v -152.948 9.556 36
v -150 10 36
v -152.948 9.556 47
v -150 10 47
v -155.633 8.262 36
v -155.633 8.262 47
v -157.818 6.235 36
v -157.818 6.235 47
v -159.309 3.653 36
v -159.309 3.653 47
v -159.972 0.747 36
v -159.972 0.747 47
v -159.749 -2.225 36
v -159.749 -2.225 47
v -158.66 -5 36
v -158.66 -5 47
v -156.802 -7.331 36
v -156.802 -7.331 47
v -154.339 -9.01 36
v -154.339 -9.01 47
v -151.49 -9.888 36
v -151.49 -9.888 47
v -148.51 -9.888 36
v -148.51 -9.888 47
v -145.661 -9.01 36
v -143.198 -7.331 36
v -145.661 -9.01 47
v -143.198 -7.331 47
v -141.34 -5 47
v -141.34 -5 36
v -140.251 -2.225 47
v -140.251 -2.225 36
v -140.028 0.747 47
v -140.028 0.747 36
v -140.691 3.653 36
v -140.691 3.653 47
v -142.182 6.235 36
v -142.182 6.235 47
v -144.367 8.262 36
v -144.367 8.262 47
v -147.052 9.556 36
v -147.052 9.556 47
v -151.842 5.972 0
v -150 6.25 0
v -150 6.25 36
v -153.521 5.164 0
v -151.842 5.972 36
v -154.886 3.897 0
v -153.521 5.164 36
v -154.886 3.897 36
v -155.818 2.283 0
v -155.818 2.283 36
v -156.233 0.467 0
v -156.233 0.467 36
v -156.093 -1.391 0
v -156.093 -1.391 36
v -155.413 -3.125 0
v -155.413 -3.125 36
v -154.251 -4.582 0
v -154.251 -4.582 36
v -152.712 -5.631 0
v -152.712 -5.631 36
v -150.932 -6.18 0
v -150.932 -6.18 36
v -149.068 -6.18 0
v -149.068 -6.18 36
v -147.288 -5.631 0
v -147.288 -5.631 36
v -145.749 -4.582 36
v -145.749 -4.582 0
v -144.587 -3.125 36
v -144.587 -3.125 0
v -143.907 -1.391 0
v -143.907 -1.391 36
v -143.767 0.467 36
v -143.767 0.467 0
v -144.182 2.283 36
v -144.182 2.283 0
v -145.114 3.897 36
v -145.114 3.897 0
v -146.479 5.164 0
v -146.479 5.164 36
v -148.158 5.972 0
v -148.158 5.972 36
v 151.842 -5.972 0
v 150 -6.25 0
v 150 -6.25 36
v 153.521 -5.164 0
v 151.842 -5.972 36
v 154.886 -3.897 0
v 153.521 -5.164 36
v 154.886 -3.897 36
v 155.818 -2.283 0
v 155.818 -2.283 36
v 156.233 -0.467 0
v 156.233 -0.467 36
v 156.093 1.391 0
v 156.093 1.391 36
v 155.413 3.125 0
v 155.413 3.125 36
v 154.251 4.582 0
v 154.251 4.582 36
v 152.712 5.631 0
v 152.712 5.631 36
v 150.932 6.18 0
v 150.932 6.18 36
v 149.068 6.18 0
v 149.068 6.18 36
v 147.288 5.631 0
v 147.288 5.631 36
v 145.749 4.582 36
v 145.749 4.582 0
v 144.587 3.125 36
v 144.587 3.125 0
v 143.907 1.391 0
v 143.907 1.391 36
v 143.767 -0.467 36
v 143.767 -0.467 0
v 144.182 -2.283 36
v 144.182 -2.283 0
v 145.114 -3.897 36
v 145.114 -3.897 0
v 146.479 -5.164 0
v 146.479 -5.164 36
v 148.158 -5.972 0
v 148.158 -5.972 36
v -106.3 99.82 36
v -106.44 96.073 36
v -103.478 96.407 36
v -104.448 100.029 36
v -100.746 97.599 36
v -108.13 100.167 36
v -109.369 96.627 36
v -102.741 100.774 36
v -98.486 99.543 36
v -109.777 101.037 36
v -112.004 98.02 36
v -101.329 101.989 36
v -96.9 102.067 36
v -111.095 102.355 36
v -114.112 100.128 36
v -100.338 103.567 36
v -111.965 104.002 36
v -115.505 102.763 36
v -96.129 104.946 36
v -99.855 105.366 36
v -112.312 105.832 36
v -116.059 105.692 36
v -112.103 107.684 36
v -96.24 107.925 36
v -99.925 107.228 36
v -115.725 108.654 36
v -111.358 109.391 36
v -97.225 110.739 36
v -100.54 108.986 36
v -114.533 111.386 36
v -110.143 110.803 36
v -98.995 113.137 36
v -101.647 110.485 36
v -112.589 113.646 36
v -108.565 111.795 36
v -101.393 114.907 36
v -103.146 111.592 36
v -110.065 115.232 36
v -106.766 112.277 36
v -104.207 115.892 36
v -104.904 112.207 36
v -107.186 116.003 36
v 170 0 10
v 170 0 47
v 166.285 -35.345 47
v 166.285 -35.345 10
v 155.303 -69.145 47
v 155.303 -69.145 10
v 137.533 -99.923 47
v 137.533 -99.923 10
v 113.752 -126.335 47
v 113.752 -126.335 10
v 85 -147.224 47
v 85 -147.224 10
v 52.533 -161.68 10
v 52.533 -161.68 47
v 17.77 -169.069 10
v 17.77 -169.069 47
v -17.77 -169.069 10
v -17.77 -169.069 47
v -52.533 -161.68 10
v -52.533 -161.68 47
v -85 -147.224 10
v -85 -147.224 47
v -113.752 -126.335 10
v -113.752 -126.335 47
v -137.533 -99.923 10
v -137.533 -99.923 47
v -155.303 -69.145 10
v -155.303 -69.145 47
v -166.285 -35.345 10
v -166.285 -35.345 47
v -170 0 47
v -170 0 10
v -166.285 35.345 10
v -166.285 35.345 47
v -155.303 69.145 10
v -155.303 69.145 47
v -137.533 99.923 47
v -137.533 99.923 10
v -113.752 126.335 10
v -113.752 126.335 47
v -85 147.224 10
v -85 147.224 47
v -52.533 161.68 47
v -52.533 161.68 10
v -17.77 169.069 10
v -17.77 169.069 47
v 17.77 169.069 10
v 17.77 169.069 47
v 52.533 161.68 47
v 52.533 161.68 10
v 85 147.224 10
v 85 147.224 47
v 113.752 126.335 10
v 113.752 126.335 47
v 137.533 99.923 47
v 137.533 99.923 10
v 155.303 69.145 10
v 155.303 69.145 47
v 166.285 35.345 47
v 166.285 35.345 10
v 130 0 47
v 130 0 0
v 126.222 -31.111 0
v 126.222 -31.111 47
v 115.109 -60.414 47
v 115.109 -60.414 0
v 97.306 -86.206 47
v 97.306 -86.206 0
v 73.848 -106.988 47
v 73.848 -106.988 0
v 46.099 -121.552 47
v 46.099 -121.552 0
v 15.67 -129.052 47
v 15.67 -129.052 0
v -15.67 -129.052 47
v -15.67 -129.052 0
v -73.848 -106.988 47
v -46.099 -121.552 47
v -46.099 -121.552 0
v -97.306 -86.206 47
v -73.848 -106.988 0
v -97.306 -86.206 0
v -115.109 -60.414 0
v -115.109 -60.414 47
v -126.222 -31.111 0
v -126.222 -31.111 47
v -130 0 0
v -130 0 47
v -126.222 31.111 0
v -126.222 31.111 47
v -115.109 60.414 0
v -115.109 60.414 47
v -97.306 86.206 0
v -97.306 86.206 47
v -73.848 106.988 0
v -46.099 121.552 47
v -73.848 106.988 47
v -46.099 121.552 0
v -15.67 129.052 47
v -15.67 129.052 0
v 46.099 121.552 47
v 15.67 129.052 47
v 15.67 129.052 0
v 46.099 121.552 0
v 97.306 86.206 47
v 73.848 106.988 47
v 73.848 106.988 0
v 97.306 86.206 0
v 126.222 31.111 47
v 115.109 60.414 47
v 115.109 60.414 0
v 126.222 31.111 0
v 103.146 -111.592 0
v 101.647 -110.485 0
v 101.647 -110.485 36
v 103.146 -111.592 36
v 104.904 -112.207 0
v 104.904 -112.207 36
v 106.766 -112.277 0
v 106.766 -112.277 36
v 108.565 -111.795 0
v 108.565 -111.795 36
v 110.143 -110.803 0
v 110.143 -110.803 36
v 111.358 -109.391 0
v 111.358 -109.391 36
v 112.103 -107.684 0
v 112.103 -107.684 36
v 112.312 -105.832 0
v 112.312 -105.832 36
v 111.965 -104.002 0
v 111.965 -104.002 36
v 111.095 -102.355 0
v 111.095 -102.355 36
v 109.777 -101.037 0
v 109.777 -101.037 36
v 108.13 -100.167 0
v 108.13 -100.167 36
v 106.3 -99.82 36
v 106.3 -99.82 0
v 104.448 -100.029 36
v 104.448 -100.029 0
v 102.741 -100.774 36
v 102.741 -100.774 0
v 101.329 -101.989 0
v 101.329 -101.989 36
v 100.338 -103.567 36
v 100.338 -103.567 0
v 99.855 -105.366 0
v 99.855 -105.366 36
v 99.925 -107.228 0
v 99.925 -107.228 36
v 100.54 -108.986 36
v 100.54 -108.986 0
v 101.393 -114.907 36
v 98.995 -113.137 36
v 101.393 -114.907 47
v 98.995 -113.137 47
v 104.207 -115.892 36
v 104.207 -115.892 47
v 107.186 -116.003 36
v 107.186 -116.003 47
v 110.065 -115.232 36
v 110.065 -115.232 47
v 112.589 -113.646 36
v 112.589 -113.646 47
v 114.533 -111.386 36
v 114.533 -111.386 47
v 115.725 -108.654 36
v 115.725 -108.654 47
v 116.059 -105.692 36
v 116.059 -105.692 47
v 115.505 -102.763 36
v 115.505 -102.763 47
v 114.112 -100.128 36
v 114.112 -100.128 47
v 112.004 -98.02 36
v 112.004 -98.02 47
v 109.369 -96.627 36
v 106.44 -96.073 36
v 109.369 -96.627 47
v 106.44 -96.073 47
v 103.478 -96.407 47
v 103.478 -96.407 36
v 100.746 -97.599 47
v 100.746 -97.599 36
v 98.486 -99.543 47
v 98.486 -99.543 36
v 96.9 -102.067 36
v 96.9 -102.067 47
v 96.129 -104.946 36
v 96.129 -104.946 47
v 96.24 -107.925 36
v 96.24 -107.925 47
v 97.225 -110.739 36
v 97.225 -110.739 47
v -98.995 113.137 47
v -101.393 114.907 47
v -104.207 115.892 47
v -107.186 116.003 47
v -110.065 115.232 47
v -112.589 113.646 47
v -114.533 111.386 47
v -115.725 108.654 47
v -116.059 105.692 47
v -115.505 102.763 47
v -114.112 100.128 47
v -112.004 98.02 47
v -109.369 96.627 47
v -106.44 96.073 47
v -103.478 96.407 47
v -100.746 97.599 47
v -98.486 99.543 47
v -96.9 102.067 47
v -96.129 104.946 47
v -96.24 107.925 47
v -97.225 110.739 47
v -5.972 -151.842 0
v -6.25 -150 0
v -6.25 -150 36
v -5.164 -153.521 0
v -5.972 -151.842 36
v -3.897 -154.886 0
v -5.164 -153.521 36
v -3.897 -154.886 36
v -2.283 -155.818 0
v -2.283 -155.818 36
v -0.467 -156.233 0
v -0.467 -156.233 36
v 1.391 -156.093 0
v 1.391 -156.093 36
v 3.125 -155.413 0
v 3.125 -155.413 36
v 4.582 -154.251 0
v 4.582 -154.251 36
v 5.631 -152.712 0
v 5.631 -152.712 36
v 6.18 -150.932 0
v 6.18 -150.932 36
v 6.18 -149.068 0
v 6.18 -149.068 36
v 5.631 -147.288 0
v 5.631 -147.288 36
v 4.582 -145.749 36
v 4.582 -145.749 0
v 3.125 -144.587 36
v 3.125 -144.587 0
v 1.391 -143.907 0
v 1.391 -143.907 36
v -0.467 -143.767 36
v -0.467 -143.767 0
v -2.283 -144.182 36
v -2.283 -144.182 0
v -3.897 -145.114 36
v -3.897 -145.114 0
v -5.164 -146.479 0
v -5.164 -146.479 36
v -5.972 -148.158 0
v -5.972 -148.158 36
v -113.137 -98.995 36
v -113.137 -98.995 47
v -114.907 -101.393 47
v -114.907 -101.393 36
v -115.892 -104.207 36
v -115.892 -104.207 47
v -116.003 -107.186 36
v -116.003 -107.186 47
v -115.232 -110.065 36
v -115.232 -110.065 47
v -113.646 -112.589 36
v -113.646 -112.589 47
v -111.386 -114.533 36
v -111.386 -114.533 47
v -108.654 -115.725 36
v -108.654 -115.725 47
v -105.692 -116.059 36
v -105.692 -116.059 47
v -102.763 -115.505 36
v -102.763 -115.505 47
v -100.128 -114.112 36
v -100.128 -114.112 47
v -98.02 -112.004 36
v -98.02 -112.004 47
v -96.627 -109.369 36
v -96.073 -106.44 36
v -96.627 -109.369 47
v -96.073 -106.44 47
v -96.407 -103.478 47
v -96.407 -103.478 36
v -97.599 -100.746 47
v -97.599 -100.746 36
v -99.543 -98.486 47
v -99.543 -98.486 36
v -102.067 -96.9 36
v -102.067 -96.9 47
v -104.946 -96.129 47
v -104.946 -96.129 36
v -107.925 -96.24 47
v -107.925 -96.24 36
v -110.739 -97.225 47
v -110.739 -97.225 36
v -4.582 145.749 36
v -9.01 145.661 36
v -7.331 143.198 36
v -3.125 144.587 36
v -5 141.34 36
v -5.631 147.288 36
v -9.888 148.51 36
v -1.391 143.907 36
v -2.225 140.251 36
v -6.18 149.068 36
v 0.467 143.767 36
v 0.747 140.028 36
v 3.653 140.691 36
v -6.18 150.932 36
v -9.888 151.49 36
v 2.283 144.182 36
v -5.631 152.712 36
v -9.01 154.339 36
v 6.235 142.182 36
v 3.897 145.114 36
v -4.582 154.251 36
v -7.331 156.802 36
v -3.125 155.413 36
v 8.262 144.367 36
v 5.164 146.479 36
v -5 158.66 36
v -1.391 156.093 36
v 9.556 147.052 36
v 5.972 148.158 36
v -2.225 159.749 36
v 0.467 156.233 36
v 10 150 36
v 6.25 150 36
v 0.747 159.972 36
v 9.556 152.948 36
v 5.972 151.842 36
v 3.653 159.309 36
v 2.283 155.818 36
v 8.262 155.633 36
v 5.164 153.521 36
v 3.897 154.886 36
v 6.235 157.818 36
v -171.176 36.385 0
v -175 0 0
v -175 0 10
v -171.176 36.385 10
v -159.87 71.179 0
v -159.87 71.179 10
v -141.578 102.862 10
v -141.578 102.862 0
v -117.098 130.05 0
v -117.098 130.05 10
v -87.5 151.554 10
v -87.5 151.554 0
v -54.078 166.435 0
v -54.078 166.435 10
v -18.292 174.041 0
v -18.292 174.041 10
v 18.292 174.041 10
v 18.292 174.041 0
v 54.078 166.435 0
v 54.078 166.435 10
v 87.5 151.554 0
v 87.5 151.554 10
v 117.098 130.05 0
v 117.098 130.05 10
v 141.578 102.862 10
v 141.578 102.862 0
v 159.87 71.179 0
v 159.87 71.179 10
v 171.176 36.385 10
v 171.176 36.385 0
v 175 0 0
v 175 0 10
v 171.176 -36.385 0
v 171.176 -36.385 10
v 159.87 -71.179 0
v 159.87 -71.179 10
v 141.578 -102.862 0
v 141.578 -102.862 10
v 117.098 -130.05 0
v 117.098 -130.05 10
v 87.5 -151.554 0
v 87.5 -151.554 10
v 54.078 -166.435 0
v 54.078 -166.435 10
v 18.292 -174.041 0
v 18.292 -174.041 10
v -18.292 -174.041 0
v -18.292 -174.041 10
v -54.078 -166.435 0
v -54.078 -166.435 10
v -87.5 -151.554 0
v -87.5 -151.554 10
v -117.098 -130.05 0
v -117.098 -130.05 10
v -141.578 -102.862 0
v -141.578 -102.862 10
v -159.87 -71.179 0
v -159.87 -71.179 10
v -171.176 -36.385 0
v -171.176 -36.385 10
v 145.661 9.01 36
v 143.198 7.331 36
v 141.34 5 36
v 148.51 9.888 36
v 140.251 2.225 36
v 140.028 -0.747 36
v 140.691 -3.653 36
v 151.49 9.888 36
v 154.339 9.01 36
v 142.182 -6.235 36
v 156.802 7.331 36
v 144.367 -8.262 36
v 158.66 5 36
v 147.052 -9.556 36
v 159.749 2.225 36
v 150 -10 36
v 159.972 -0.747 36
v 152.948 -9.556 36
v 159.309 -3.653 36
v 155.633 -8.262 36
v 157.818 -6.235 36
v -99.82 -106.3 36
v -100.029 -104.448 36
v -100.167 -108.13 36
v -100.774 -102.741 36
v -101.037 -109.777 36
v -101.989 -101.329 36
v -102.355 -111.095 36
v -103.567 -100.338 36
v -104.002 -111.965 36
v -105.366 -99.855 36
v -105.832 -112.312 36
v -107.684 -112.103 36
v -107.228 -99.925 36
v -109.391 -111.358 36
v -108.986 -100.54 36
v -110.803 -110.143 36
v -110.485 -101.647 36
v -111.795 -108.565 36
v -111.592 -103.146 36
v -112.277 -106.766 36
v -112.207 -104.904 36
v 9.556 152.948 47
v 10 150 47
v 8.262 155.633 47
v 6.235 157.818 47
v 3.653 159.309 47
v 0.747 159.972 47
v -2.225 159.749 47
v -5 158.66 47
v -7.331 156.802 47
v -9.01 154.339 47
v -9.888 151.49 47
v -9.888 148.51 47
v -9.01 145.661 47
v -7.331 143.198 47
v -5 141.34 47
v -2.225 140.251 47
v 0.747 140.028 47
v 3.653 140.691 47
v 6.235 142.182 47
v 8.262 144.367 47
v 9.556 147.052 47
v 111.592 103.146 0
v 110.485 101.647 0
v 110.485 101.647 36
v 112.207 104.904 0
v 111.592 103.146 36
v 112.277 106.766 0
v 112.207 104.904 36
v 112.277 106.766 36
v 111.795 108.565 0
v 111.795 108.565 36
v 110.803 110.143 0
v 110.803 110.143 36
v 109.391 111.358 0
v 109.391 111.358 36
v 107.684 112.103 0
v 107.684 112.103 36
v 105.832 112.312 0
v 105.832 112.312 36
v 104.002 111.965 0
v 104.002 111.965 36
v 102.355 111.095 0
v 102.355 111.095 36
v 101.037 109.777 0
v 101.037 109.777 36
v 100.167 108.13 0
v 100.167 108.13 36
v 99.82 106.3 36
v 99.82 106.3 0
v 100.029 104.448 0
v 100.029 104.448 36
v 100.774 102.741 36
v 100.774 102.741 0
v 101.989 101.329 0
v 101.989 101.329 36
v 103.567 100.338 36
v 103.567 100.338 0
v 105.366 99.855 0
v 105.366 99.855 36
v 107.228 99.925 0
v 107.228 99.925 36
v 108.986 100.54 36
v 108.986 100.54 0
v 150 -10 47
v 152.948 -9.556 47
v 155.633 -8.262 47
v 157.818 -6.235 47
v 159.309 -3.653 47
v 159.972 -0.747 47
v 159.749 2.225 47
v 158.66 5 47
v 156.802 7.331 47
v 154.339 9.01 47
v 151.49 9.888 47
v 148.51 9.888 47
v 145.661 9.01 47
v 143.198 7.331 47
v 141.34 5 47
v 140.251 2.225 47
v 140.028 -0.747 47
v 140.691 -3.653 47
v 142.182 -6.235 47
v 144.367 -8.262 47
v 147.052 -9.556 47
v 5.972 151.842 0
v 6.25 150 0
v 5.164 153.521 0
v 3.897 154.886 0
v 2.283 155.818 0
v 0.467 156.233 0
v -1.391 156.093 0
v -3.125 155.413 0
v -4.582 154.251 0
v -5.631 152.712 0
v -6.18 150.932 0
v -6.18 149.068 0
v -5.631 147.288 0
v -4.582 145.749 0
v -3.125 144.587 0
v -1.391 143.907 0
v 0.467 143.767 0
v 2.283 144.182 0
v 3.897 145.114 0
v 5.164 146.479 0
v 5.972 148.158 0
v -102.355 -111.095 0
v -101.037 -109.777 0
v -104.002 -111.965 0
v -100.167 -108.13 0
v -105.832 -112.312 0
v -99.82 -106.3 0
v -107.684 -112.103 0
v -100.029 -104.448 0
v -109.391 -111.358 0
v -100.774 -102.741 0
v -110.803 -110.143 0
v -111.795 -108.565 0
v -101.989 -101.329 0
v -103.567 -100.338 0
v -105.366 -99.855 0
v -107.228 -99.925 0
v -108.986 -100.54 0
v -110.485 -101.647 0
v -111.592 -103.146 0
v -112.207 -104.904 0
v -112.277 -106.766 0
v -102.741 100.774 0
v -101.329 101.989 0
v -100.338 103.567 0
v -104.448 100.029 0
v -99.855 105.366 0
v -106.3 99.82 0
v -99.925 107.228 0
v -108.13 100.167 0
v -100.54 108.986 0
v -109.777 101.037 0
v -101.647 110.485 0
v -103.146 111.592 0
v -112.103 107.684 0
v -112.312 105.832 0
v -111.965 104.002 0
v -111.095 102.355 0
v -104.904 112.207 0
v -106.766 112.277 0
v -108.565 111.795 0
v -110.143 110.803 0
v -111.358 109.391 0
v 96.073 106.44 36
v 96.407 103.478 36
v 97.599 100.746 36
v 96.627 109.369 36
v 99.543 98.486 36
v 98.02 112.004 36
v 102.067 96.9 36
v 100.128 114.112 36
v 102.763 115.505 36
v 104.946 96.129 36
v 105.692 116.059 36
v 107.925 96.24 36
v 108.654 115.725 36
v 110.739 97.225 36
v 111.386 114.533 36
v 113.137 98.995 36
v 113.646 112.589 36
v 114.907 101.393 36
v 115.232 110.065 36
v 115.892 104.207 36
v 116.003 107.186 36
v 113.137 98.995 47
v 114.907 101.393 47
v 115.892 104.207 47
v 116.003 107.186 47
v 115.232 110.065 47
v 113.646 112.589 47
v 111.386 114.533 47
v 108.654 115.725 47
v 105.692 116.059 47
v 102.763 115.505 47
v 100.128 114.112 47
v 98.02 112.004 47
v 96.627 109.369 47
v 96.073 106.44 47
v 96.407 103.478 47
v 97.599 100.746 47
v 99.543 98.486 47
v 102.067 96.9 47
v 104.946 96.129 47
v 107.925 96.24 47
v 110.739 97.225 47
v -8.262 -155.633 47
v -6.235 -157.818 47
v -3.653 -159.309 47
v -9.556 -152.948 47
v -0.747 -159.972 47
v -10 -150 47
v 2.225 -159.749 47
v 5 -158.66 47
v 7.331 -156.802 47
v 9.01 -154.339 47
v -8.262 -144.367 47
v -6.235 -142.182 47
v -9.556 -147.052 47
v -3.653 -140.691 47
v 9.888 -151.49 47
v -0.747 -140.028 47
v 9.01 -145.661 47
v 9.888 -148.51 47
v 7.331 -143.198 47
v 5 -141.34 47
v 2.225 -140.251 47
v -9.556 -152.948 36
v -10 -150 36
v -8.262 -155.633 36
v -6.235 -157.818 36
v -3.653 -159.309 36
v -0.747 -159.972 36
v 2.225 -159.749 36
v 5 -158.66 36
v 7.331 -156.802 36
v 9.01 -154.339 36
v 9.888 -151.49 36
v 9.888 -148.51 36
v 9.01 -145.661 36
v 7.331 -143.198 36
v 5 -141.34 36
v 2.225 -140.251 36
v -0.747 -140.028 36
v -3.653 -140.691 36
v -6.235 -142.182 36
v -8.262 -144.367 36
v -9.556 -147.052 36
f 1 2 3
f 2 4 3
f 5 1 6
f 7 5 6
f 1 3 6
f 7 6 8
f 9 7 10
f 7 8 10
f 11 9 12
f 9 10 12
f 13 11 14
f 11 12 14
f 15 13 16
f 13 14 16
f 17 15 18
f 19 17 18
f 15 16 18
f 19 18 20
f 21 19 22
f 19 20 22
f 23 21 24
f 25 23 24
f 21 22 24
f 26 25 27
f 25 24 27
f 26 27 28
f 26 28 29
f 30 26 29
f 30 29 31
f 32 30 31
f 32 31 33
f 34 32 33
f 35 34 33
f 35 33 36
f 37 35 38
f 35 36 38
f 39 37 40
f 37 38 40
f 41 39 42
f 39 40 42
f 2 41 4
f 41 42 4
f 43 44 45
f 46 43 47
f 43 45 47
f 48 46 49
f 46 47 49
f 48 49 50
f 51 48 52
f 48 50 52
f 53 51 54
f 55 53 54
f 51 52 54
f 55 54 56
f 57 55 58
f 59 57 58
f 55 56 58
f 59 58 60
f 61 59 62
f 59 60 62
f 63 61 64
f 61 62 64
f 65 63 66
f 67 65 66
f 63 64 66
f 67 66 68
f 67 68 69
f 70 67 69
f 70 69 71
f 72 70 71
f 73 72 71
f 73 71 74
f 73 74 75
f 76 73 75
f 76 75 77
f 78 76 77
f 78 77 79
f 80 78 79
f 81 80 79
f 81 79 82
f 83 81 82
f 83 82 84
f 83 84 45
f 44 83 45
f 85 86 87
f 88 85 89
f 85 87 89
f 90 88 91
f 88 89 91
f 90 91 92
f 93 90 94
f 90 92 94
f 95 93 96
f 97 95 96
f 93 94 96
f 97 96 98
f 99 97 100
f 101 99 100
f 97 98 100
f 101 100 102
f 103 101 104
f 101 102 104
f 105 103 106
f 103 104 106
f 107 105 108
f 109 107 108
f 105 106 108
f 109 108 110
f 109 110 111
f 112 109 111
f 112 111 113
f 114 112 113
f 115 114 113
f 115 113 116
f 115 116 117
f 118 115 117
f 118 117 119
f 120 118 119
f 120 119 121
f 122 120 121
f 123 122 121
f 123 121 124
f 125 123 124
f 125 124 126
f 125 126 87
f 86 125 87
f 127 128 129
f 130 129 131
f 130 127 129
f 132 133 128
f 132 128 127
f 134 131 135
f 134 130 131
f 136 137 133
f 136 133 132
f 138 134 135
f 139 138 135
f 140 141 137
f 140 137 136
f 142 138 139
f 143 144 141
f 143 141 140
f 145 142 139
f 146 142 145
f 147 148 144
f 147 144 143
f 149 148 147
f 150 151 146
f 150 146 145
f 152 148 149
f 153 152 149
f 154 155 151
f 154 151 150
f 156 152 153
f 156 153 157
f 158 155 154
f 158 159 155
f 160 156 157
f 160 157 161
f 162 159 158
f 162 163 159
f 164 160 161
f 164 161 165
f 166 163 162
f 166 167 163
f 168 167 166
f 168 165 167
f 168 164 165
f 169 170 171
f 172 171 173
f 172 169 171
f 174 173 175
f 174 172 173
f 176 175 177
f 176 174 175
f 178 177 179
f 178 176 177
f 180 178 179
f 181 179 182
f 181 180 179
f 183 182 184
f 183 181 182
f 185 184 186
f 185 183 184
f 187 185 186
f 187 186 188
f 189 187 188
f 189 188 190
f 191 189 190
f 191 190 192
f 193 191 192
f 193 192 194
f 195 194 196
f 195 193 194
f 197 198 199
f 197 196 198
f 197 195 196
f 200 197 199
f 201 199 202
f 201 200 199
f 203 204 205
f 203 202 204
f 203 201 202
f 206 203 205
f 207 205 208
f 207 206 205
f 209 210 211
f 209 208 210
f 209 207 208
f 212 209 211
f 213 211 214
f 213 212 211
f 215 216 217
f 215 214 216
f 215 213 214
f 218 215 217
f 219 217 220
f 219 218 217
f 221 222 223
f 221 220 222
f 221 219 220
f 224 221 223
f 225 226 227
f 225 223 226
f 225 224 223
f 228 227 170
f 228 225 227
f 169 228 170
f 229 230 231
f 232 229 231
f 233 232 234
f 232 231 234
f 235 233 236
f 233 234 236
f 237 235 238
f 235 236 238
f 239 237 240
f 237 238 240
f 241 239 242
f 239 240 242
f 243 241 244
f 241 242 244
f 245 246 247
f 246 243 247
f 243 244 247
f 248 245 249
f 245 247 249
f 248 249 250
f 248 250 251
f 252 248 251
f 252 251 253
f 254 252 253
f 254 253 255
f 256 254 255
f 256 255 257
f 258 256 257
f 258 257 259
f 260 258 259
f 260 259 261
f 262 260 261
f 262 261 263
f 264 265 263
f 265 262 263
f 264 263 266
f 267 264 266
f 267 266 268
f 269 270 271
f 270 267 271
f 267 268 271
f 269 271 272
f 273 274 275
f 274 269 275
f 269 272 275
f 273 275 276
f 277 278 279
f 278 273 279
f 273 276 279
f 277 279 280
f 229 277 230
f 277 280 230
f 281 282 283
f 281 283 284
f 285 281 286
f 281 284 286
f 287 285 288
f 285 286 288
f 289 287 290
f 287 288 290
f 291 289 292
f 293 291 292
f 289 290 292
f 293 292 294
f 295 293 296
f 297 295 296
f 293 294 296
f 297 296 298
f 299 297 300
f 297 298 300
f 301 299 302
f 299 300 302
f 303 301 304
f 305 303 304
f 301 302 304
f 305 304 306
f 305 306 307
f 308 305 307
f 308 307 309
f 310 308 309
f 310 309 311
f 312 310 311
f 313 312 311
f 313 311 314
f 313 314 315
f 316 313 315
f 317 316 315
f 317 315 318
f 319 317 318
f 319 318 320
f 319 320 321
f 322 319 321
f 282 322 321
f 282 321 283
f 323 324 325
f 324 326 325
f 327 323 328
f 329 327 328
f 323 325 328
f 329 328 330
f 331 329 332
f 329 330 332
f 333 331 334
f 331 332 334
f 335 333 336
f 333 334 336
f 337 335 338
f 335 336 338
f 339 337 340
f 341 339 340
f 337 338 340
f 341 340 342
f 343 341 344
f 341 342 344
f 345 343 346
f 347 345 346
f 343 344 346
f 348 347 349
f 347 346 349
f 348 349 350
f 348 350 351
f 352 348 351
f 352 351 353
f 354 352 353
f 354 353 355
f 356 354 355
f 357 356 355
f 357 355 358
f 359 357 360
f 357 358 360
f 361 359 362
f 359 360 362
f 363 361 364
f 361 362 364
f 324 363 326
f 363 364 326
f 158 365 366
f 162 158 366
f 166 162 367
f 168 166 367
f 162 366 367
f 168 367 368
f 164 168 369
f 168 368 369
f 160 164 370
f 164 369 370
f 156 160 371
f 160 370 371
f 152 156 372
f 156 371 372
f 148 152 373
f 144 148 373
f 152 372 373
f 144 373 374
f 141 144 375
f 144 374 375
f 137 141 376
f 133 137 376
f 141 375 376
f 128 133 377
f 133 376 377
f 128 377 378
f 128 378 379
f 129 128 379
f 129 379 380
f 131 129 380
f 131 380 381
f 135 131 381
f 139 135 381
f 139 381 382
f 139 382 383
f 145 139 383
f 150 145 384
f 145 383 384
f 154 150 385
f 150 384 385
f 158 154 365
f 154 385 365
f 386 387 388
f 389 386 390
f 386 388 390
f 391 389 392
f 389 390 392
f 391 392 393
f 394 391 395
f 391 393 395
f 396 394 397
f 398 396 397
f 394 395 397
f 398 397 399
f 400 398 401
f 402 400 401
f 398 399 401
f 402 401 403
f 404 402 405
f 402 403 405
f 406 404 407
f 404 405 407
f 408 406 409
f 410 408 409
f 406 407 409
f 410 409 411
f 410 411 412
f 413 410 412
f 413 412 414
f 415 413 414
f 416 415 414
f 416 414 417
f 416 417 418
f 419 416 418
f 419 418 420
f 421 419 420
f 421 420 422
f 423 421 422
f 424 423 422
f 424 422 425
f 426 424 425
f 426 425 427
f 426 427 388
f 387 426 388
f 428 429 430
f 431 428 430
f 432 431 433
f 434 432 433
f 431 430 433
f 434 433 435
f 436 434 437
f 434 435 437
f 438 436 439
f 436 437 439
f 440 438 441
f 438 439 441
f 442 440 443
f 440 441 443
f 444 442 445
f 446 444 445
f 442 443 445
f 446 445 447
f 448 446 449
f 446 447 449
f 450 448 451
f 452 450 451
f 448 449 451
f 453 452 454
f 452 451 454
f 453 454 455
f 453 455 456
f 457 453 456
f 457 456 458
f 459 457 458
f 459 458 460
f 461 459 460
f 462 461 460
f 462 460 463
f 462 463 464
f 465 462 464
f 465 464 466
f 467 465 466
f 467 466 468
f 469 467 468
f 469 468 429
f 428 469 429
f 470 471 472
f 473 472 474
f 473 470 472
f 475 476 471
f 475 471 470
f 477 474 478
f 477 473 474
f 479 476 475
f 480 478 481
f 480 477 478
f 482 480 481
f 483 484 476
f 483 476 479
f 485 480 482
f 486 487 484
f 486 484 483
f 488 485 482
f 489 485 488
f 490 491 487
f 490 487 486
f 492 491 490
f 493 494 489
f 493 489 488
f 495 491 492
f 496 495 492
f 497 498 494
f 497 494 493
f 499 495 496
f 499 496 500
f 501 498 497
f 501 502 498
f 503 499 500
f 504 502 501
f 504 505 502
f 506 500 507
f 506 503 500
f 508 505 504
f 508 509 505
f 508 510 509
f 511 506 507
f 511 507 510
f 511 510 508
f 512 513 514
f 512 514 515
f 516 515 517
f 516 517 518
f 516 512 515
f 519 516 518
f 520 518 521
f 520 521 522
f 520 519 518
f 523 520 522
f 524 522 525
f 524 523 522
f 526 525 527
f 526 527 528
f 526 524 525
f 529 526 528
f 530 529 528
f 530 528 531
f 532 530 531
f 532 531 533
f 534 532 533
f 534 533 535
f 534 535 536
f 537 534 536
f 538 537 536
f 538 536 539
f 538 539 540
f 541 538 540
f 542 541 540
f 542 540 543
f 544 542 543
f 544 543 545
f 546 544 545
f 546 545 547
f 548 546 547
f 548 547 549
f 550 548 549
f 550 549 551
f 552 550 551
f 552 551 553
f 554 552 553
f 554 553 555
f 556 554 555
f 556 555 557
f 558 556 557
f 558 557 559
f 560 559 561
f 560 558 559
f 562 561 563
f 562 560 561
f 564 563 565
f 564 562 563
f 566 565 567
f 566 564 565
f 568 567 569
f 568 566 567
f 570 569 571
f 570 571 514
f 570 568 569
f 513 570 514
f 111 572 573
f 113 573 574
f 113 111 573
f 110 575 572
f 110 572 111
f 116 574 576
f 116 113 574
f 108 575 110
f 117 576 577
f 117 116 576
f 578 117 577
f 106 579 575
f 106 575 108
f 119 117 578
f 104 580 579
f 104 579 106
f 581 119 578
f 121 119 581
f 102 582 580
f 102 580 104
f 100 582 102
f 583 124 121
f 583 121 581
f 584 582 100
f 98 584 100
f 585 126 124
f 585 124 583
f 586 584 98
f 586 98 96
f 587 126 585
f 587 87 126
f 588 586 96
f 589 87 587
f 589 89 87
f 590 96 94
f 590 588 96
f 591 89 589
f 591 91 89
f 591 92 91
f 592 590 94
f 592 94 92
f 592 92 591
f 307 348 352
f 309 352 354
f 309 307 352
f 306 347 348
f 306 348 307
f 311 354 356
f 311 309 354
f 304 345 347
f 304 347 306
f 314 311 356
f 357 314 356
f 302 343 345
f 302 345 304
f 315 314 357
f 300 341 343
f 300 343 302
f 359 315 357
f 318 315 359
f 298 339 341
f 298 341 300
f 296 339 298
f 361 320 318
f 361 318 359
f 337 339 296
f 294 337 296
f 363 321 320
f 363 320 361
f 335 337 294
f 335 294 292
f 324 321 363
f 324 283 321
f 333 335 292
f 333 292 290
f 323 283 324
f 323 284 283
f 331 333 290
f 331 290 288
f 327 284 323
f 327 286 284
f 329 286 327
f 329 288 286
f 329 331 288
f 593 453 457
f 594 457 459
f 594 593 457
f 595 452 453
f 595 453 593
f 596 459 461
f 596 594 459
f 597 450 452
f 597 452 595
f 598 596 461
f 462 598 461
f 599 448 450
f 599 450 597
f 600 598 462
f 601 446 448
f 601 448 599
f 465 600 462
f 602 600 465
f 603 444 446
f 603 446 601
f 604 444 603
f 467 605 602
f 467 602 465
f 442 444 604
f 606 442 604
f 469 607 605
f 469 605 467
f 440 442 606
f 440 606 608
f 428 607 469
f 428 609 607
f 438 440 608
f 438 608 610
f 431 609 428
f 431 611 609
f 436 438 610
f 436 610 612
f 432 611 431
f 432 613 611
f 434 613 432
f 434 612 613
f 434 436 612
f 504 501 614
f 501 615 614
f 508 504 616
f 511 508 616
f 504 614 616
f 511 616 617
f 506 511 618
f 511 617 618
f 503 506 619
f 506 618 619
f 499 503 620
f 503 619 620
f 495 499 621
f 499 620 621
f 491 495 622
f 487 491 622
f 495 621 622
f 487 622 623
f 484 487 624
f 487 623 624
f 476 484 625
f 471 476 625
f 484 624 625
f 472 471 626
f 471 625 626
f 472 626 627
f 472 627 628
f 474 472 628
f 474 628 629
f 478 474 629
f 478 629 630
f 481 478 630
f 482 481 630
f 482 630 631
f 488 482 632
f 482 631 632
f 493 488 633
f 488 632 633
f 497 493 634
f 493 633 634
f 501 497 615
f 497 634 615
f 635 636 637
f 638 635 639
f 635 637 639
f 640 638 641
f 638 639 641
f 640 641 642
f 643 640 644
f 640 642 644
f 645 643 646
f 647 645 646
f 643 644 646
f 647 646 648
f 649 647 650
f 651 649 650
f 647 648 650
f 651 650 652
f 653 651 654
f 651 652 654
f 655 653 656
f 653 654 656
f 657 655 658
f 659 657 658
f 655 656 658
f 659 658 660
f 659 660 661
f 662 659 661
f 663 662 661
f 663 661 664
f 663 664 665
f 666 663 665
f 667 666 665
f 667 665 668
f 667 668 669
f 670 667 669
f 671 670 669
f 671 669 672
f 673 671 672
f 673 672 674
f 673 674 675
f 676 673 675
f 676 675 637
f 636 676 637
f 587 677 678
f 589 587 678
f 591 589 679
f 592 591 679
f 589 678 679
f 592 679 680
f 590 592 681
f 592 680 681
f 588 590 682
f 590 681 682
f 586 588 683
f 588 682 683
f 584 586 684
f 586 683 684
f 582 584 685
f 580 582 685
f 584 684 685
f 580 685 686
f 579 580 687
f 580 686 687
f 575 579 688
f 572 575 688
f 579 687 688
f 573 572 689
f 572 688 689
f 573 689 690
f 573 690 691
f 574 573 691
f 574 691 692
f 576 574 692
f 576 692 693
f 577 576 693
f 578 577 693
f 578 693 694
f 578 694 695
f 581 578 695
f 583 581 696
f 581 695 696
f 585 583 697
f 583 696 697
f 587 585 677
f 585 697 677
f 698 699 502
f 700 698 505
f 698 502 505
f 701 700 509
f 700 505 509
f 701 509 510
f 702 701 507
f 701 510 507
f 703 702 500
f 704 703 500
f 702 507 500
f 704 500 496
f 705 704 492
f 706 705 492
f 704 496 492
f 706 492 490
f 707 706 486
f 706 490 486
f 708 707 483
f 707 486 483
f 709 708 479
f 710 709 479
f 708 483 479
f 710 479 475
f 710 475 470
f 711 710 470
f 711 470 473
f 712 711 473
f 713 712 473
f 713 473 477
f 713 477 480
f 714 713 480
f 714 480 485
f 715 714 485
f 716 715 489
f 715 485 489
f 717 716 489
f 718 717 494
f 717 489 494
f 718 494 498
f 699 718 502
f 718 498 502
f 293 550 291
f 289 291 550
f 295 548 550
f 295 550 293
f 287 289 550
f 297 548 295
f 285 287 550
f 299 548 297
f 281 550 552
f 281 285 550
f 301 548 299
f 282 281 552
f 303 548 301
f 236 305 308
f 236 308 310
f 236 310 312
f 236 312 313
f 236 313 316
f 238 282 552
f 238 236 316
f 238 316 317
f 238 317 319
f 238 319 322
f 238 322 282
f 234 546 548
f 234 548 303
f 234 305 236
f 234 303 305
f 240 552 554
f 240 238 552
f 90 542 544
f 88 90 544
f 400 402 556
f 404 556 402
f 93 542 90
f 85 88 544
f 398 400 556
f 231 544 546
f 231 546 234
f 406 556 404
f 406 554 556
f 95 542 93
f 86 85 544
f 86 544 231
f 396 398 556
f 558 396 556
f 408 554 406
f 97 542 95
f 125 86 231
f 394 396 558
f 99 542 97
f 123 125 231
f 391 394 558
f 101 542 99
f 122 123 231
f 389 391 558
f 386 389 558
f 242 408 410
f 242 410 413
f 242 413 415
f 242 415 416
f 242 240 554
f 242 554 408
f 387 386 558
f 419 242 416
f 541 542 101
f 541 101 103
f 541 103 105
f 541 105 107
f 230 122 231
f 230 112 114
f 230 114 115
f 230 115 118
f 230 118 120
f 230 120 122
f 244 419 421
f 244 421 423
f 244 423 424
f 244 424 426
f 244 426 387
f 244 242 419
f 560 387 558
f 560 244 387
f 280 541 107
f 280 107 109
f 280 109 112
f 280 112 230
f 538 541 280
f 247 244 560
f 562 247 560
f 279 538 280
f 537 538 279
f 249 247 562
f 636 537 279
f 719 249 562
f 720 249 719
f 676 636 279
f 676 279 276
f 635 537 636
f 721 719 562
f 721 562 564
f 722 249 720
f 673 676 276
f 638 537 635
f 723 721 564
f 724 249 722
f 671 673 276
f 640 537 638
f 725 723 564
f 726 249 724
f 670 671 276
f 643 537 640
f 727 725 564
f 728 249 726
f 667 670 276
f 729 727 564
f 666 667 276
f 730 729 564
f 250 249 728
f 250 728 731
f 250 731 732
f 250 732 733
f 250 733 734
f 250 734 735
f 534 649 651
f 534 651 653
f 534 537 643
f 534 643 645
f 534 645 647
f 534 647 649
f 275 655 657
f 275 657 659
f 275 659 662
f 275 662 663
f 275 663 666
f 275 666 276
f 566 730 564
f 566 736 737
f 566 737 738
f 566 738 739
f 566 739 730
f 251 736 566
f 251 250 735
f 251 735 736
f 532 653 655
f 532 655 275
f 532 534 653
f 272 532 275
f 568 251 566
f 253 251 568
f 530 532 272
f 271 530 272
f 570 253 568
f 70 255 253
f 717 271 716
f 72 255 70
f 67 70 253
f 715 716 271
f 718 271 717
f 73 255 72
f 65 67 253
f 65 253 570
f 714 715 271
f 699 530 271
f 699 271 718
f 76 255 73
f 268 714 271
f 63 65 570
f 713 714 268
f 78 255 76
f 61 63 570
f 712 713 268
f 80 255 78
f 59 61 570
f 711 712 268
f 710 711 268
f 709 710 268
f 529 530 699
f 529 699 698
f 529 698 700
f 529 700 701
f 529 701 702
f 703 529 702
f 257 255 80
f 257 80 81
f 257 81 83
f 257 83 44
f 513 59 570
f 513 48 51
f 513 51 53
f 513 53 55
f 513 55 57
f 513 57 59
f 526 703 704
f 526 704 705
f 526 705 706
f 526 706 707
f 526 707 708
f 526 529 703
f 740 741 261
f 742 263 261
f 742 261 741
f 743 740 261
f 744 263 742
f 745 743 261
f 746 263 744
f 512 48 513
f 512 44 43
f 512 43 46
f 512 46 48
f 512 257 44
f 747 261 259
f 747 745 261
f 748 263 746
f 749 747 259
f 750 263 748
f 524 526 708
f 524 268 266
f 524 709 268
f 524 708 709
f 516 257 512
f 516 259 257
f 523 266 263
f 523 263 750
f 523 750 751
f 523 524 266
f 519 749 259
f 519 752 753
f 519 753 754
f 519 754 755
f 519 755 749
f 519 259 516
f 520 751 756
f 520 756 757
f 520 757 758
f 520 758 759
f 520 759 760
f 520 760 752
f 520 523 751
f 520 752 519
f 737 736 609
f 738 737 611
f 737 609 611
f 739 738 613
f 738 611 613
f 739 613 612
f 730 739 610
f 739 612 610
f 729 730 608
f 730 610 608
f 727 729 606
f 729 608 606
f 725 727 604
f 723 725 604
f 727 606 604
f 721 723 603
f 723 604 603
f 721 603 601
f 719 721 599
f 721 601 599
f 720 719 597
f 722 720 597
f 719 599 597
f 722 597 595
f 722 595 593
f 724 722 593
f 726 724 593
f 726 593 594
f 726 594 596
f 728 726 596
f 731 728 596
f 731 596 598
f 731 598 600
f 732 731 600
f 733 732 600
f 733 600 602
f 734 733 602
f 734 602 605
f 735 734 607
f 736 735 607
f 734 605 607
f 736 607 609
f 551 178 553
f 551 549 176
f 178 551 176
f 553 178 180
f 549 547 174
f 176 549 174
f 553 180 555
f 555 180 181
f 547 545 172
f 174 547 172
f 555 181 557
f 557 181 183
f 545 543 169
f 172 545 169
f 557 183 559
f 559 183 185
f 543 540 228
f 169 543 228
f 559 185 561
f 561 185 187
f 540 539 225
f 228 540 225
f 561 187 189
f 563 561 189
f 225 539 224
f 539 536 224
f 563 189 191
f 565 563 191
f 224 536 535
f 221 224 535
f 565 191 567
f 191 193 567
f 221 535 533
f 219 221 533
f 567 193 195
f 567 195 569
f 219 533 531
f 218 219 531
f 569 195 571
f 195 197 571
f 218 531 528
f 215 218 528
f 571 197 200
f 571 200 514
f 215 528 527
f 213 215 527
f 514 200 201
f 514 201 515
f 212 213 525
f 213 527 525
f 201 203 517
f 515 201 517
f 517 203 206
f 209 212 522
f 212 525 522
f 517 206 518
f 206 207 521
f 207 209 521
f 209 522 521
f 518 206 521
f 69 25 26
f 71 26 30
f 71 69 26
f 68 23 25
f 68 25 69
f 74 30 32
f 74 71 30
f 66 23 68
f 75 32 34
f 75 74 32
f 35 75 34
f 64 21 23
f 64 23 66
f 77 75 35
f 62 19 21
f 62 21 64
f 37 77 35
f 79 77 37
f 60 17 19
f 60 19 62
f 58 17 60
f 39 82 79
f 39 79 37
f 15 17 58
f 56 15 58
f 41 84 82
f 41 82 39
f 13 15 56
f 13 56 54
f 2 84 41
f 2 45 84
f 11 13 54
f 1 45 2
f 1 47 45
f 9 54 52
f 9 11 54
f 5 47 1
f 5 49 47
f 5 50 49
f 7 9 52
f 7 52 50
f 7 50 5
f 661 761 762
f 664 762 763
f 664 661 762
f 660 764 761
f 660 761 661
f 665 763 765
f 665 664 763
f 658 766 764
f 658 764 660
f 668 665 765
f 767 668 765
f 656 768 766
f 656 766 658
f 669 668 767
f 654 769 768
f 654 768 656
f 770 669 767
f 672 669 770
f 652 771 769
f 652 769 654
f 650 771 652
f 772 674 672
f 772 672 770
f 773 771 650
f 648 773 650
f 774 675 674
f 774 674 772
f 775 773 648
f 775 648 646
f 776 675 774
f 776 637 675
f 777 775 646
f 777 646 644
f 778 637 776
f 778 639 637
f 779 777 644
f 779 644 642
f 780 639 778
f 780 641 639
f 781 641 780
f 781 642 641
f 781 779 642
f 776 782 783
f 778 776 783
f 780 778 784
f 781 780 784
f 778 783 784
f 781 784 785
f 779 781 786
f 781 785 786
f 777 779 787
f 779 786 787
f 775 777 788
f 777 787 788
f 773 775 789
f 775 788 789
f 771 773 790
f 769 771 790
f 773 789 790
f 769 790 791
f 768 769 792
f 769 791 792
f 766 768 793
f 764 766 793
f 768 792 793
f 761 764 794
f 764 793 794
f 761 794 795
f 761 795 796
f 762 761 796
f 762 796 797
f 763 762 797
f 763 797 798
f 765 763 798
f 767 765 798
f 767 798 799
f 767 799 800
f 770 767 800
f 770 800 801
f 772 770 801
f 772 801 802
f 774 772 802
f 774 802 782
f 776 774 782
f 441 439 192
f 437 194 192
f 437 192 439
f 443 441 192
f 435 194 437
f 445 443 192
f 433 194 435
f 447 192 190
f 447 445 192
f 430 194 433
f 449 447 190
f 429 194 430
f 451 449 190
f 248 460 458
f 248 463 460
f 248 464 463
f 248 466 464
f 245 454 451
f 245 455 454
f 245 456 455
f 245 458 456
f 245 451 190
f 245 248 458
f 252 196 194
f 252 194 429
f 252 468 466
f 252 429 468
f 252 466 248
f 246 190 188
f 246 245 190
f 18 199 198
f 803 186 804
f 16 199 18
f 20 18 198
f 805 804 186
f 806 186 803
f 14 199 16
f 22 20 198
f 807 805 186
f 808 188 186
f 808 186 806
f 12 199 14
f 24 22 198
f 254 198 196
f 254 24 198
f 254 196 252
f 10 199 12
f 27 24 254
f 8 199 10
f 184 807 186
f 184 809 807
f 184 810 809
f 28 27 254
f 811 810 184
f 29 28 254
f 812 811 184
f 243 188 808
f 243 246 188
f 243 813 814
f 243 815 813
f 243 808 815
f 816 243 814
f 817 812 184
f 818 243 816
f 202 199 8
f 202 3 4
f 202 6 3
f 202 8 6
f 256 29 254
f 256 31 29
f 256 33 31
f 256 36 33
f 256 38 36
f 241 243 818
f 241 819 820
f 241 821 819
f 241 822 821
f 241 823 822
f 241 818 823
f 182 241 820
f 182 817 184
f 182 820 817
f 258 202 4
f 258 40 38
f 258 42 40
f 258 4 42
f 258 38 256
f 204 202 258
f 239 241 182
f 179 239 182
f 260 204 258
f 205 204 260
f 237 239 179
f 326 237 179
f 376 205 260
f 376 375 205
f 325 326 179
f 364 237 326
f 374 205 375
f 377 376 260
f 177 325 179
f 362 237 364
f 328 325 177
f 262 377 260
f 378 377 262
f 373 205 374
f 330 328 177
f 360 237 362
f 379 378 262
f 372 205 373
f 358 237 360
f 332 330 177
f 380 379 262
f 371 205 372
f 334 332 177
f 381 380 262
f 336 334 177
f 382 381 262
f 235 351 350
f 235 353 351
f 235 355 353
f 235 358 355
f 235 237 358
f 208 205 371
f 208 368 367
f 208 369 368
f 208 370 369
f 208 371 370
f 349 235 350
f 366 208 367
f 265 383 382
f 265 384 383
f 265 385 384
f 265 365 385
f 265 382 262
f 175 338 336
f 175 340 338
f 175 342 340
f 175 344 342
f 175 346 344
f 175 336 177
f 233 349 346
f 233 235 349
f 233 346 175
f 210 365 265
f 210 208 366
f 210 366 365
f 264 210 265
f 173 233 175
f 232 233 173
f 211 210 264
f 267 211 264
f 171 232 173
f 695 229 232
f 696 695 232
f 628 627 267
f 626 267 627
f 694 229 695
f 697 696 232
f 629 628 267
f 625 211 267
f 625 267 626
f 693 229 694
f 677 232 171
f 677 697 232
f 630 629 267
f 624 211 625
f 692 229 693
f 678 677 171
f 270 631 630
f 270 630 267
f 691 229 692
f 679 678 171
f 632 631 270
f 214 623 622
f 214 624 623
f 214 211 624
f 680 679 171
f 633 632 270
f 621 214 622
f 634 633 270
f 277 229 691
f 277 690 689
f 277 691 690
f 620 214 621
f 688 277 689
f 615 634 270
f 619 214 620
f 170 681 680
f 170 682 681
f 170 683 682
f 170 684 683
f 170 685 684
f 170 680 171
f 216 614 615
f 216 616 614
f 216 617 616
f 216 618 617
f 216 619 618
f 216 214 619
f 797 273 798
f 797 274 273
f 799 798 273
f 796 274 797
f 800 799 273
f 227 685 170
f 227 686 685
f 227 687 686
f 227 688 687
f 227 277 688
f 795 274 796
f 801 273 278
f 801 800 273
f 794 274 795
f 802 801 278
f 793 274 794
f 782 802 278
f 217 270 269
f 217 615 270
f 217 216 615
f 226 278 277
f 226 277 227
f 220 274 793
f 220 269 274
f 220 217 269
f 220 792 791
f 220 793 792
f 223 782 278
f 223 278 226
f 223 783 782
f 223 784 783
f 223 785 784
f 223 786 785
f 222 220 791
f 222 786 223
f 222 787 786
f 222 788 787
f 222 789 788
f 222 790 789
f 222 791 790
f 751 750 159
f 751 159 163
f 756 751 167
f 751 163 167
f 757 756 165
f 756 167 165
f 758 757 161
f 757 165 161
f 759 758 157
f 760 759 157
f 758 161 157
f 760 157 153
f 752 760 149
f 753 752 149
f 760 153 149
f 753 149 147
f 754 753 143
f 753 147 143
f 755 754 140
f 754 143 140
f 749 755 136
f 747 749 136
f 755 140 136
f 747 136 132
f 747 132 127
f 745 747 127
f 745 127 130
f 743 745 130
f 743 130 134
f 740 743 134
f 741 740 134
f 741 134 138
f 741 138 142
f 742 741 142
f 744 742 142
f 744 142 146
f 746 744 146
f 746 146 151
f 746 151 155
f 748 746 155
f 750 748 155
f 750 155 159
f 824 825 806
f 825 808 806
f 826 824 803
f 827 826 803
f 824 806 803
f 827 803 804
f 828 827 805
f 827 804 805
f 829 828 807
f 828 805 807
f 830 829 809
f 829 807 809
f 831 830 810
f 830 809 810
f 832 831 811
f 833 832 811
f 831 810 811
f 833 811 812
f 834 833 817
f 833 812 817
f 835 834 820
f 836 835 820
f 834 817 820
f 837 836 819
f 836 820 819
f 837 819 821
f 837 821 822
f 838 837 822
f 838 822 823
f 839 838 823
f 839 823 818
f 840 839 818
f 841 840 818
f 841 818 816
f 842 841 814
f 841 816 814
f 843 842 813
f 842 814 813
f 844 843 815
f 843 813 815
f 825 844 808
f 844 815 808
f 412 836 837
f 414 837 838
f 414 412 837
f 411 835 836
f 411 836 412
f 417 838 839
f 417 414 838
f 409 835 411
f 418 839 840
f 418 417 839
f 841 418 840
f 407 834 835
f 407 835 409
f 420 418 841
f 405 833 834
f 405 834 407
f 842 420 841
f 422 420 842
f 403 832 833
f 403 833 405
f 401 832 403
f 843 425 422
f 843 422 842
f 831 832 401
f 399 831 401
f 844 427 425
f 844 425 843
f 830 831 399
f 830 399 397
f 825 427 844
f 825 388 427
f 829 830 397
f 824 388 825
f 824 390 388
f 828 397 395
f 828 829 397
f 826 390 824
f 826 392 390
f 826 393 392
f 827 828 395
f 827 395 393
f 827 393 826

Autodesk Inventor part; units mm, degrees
ref_plane "YZ Plane" through (0, 0, 0) normal (1, 0, 0) x (0, 1, 0)
ref_plane "XZ Plane" through (0, 0, 0) normal (0, 1, 0) x (-1, 0, 0)
ref_plane "XY Plane" through (0, 0, 0) normal (0, 0, 1) x (1, 0, 0)
sketch "Sketch1" plane through (0, 0, 0) normal (0, 0, 1) x (1, 0, 0)
  circle A0 centre (0, 0) radius 130
  circle A1 centre (0, 0) radius 170
  dimension "d0" = 40
  dimension "d1" = 260
extrude "Extrusion1" add sketch "Sketch1" along normal blind 47
sketch "Sketch2" plane through (0, 0, 47) normal (0, 0, 1) x (1, 0, 0)
  circle A0 centre (0, 0) radius 170 construction
  circle A1 centre (0, 0) radius 130 construction
  line L0 (0, 170) -> (0, 130) construction
  circle A2 centre (0, 150) radius 6.25
  dimension "d4" = 12.5
extrude "Extrusion2" cut sketch "Sketch2" against normal through all
sketch "Sketch3" plane through (0, 0, 47) normal (0, 0, 1) x (1, 0, 0)
  circle A0 centre (0, 150) radius 6.25 projected
  circle A1 centre (0, 150) radius 10
  point P0 (0, 0)
  dimension "d10" = 20
extrude "Extrusion3" cut sketch "Sketch3" against normal blind 11
pattern_circular "Circular Pattern1" count 8 over 360 about axis through (0, 0, 0) along (0, 0, 1) of "Extrusion2", "Extrusion3"
sketch "Sketch4" plane through (0, 0, 0) normal (0, 0, -1) x (-1, 0, 0)
  circle A0 centre (0, 0) radius 170 projected
  circle A1 centre (0, 0) radius 175
  dimension "d13" = 5
extrude "Extrusion4" add sketch "Sketch4" against normal blind 10
equation "\"d1\" = Вал_ось_диаметр_НОС"
equation "\"d2\" = Барабан_толщина_посад_кольца"
equation "\"Вал_ось_диаметр_НОС\" = 260"
equation "\"Барабан_толщина_посад_кольца\" = 47"
properties part number "ДМС 102 Опорное кольцо вала перед ПВГ"
